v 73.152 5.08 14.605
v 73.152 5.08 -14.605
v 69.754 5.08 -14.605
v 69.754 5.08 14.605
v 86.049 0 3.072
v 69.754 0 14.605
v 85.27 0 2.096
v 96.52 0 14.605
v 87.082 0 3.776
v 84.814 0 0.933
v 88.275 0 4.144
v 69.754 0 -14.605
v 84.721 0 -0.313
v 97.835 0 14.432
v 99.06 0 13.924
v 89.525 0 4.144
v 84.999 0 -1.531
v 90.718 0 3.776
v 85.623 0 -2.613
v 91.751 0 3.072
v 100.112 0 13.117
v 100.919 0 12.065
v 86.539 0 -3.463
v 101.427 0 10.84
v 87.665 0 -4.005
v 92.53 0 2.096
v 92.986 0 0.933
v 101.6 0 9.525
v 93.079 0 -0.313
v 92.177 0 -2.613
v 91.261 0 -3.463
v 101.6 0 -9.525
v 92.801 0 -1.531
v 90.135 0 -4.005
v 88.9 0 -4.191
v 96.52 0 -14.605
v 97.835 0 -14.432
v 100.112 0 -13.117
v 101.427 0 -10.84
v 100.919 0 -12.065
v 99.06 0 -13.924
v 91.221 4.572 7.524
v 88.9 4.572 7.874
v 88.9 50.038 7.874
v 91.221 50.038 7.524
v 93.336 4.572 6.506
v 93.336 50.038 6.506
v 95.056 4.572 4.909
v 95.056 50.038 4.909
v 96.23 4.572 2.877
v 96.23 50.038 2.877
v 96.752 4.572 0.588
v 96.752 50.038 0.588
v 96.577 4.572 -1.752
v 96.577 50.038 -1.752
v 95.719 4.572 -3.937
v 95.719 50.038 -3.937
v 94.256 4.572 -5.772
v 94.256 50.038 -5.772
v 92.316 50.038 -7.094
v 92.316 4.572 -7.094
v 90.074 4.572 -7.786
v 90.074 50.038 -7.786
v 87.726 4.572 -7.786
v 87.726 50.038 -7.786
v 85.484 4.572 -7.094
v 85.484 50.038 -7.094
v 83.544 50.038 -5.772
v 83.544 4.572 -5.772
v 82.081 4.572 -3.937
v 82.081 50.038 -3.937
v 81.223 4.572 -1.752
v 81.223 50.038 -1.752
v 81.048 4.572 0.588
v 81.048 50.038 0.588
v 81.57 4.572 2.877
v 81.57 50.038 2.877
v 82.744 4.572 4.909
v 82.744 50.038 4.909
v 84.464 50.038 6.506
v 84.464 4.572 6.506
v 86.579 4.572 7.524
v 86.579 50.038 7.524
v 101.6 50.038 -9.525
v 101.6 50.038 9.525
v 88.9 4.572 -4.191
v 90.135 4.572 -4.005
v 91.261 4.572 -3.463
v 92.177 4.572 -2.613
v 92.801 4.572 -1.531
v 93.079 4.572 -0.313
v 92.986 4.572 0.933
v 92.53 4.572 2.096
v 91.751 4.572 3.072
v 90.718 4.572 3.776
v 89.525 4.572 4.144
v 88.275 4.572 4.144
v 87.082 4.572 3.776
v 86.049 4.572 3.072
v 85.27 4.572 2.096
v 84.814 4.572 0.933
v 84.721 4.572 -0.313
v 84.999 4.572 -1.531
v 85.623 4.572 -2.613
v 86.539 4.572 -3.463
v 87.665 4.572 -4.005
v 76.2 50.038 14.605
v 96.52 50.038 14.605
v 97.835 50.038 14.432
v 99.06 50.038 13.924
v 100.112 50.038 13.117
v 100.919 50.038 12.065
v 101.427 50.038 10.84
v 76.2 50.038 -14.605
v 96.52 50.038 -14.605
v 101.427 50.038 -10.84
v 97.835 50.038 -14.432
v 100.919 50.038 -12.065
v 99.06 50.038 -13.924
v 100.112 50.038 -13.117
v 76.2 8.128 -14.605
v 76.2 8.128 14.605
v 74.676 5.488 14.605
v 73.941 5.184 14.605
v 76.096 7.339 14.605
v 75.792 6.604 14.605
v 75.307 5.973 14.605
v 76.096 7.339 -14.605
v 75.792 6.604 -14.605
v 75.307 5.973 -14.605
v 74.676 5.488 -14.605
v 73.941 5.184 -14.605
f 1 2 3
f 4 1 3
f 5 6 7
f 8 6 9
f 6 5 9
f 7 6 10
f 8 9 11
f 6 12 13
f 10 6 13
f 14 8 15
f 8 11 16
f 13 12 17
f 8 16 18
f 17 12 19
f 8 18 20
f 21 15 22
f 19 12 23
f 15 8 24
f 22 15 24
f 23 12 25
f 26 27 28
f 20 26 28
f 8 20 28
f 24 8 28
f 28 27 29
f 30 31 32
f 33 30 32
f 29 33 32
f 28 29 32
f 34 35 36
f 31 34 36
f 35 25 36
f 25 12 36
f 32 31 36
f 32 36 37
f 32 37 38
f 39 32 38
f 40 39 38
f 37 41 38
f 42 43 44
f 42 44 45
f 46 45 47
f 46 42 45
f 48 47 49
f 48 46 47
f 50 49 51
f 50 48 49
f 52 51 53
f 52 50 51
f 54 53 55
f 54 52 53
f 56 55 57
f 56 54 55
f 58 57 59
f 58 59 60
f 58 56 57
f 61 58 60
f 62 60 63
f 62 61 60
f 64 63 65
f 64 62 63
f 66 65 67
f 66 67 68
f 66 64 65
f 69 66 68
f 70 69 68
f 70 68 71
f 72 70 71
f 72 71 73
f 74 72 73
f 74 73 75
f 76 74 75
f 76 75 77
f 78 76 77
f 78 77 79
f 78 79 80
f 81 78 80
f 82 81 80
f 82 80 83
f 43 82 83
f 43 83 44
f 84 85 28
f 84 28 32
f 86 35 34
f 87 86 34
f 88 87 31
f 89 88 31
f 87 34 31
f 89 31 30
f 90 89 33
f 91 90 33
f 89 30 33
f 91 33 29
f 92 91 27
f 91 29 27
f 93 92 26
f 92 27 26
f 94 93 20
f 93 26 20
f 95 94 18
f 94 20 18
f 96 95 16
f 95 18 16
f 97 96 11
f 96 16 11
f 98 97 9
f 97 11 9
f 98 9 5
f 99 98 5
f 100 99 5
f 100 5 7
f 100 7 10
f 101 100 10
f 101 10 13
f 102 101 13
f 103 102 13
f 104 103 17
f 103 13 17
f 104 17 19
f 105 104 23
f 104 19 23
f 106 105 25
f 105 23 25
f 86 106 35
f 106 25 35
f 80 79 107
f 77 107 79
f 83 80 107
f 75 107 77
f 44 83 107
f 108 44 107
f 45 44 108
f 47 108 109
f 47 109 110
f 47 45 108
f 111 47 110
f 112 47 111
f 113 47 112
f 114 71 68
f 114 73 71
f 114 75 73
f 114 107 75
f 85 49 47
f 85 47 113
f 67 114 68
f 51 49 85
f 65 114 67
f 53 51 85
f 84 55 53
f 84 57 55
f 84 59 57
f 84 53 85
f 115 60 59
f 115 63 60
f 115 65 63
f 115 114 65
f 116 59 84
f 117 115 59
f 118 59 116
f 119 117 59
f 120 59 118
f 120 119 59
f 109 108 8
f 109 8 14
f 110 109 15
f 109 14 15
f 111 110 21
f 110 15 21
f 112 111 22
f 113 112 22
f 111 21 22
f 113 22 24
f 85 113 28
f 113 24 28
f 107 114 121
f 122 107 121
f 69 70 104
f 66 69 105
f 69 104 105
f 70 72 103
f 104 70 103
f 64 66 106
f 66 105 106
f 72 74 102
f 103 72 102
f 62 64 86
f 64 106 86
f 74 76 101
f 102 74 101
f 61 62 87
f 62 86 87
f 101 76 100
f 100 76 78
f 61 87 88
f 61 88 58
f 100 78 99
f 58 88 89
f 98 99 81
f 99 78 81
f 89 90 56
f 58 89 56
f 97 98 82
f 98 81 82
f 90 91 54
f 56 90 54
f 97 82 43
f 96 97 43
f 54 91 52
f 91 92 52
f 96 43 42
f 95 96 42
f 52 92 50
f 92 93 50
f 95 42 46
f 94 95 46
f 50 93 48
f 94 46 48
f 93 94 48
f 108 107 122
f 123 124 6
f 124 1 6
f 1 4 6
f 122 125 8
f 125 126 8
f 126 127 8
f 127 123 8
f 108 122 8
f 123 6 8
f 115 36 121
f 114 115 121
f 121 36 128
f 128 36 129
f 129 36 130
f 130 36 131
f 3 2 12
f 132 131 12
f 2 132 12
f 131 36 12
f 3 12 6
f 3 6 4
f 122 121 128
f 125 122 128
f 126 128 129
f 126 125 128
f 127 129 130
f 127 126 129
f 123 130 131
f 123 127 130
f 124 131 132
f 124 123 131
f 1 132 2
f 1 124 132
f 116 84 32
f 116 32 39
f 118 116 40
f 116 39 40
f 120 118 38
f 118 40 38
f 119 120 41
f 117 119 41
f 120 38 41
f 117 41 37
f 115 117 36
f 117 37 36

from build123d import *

# Parameters (mm, degrees)
SKETCH1_R                = 13.97
SKETCH1_R_2              = 1.275
BOSS_EXTRUDE1_DEPTH      = 3.048
BOSS_EXTRUDE2_DEPTH      = 46.99
BOSS_EXTRUDE2_DEPTH_BACK = 3.048
SKETCH2_R                = 7.874
SKETCH2_R_2              = 1.275
CUT_EXTRUDE2_DEPTH       = 117.959760362
SKETCH6_R                = 8.89
SKETCH6_R_2              = 4.191
BOSS_EXTRUDE3_DEPTH      = 4.572
FILLET2_R                = 3.048
SKETCH7_W                = 199.707818202
SKETCH7_H                = 58.861251681
CUT_EXTRUDE3_DEPTH       = 117.959760362


with BuildPart() as part:
    # Sketch1 → Boss-Extrude1 (new body)
    with BuildSketch(Plane(origin=(0, 0, 0), x_dir=(1, 0, 0), z_dir=(0, 1, 0))):
        with Locations(Location((0, 0, 0), (0, 0, 90))):
            Circle(SKETCH1_R)
        with Locations(Location((0, 9.5, 0), (0, 0, 90))):
            Circle(SKETCH1_R_2, mode=Mode.SUBTRACT)
        with Locations(Location((9.5, 0, 0), (0, 0, 90))):
            Circle(SKETCH1_R_2, mode=Mode.SUBTRACT)
        with Locations(Location((0, -9.5, 0), (0, 0, 90))):
            Circle(SKETCH1_R_2, mode=Mode.SUBTRACT)
        with Locations(Location((-9.5, 0, 0), (0, 0, 90))):
            Circle(SKETCH1_R_2, mode=Mode.SUBTRACT)
    extrude(amount=BOSS_EXTRUDE1_DEPTH)

    # Sketch2 → Boss-Extrude2 (add, two sides: drawn at the far end of the back side and taken through both)
    with BuildSketch(Plane(origin=(0, 3.048, 0), x_dir=(1, 0, 0), z_dir=(0, 1, 0)).offset(-BOSS_EXTRUDE2_DEPTH_BACK)):
        with BuildLine():
            Line((-96.52, -14.605), (96.52, -14.605))
            ThreePointArc((96.52, -14.605), (100.112102448, -13.117102448), (101.6, -9.525))
            Line((101.6, -9.525), (101.6, 9.525))
            ThreePointArc((101.6, 9.525), (100.112102448, 13.117102448), (96.52, 14.605))
            Line((96.52, 14.605), (-96.52, 14.605))
            ThreePointArc((-96.52, 14.605), (-100.112102448, 13.117102448), (-101.6, 9.525))
            Line((-101.6, 9.525), (-101.6, -9.525))
            ThreePointArc((-101.6, -9.525), (-100.112102448, -13.117102448), (-96.52, -14.605))
        make_face()
        with Locations(Location((-88.9, 0, 0), (0, 0, 270))):
            Circle(SKETCH2_R, mode=Mode.SUBTRACT)
        with Locations(Location((88.9, 0, 0), (0, 0, 270))):
            Circle(SKETCH2_R, mode=Mode.SUBTRACT)
        with Locations(Location((9.5, 0, 0), (0, 0, 90))):
            Circle(SKETCH2_R_2, mode=Mode.SUBTRACT)
        with Locations(Location((0, 9.5, 0), (0, 0, 90))):
            Circle(SKETCH2_R_2, mode=Mode.SUBTRACT)
        with Locations(Location((-9.5, 0, 0), (0, 0, 90))):
            Circle(SKETCH2_R_2, mode=Mode.SUBTRACT)
        with Locations(Location((0, -9.5, 0), (0, 0, 90))):
            Circle(SKETCH2_R_2, mode=Mode.SUBTRACT)
    extrude(amount=BOSS_EXTRUDE2_DEPTH + BOSS_EXTRUDE2_DEPTH_BACK)

    # Sketch5 → Cut-Extrude2 (cut, through all)
    with BuildSketch(Plane(origin=(0, 0, -14.605), x_dir=(-1, 0, 0), z_dir=(0, 0, -1))):
        Polygon((-76.2, 5.08), (0, 5.08), (76.2, 5.08), (76.2, 50.038), (-76.2, 50.038), align=None)
    extrude(amount=-CUT_EXTRUDE2_DEPTH, mode=Mode.SUBTRACT)

    # Sketch6 → Boss-Extrude3 (add)
    # profile 1 of 2: a face of its own
    with BuildSketch(Plane.XZ):
        with Locations((-88.9, 0)):
            Circle(SKETCH6_R)
        with Locations(Location((-88.9, 0, 0), (0, 0, 270))):
            Circle(SKETCH6_R_2, mode=Mode.SUBTRACT)
    # profile 2 of 2: a face of its own
    with BuildSketch(Plane.XZ):
        with Locations((88.9, 0)):
            Circle(SKETCH6_R)
        with Locations(Location((88.9, 0, 0), (0, 0, 270))):
            Circle(SKETCH6_R_2, mode=Mode.SUBTRACT)
    extrude(amount=-BOSS_EXTRUDE3_DEPTH)

    # Fillet2
    fillet2_edges = [part.edges().sort_by_distance(p)[0] for p in [
        (-76.2, 5.08, 0),
        (76.2, 5.08, 0),
    ]]
    fillet(fillet2_edges, radius=FILLET2_R)

    # Sketch7 → Cut-Extrude3 (cut, through all)
    with BuildSketch(Plane(origin=(0, 0, -14.605), x_dir=(-1, 0, 0), z_dir=(0, 0, -1))):
        with Locations((30.0995037, 26.703530829)):
            Rectangle(SKETCH7_W, SKETCH7_H)
    extrude(amount=-CUT_EXTRUDE3_DEPTH, mode=Mode.SUBTRACT)


solid = part.part
